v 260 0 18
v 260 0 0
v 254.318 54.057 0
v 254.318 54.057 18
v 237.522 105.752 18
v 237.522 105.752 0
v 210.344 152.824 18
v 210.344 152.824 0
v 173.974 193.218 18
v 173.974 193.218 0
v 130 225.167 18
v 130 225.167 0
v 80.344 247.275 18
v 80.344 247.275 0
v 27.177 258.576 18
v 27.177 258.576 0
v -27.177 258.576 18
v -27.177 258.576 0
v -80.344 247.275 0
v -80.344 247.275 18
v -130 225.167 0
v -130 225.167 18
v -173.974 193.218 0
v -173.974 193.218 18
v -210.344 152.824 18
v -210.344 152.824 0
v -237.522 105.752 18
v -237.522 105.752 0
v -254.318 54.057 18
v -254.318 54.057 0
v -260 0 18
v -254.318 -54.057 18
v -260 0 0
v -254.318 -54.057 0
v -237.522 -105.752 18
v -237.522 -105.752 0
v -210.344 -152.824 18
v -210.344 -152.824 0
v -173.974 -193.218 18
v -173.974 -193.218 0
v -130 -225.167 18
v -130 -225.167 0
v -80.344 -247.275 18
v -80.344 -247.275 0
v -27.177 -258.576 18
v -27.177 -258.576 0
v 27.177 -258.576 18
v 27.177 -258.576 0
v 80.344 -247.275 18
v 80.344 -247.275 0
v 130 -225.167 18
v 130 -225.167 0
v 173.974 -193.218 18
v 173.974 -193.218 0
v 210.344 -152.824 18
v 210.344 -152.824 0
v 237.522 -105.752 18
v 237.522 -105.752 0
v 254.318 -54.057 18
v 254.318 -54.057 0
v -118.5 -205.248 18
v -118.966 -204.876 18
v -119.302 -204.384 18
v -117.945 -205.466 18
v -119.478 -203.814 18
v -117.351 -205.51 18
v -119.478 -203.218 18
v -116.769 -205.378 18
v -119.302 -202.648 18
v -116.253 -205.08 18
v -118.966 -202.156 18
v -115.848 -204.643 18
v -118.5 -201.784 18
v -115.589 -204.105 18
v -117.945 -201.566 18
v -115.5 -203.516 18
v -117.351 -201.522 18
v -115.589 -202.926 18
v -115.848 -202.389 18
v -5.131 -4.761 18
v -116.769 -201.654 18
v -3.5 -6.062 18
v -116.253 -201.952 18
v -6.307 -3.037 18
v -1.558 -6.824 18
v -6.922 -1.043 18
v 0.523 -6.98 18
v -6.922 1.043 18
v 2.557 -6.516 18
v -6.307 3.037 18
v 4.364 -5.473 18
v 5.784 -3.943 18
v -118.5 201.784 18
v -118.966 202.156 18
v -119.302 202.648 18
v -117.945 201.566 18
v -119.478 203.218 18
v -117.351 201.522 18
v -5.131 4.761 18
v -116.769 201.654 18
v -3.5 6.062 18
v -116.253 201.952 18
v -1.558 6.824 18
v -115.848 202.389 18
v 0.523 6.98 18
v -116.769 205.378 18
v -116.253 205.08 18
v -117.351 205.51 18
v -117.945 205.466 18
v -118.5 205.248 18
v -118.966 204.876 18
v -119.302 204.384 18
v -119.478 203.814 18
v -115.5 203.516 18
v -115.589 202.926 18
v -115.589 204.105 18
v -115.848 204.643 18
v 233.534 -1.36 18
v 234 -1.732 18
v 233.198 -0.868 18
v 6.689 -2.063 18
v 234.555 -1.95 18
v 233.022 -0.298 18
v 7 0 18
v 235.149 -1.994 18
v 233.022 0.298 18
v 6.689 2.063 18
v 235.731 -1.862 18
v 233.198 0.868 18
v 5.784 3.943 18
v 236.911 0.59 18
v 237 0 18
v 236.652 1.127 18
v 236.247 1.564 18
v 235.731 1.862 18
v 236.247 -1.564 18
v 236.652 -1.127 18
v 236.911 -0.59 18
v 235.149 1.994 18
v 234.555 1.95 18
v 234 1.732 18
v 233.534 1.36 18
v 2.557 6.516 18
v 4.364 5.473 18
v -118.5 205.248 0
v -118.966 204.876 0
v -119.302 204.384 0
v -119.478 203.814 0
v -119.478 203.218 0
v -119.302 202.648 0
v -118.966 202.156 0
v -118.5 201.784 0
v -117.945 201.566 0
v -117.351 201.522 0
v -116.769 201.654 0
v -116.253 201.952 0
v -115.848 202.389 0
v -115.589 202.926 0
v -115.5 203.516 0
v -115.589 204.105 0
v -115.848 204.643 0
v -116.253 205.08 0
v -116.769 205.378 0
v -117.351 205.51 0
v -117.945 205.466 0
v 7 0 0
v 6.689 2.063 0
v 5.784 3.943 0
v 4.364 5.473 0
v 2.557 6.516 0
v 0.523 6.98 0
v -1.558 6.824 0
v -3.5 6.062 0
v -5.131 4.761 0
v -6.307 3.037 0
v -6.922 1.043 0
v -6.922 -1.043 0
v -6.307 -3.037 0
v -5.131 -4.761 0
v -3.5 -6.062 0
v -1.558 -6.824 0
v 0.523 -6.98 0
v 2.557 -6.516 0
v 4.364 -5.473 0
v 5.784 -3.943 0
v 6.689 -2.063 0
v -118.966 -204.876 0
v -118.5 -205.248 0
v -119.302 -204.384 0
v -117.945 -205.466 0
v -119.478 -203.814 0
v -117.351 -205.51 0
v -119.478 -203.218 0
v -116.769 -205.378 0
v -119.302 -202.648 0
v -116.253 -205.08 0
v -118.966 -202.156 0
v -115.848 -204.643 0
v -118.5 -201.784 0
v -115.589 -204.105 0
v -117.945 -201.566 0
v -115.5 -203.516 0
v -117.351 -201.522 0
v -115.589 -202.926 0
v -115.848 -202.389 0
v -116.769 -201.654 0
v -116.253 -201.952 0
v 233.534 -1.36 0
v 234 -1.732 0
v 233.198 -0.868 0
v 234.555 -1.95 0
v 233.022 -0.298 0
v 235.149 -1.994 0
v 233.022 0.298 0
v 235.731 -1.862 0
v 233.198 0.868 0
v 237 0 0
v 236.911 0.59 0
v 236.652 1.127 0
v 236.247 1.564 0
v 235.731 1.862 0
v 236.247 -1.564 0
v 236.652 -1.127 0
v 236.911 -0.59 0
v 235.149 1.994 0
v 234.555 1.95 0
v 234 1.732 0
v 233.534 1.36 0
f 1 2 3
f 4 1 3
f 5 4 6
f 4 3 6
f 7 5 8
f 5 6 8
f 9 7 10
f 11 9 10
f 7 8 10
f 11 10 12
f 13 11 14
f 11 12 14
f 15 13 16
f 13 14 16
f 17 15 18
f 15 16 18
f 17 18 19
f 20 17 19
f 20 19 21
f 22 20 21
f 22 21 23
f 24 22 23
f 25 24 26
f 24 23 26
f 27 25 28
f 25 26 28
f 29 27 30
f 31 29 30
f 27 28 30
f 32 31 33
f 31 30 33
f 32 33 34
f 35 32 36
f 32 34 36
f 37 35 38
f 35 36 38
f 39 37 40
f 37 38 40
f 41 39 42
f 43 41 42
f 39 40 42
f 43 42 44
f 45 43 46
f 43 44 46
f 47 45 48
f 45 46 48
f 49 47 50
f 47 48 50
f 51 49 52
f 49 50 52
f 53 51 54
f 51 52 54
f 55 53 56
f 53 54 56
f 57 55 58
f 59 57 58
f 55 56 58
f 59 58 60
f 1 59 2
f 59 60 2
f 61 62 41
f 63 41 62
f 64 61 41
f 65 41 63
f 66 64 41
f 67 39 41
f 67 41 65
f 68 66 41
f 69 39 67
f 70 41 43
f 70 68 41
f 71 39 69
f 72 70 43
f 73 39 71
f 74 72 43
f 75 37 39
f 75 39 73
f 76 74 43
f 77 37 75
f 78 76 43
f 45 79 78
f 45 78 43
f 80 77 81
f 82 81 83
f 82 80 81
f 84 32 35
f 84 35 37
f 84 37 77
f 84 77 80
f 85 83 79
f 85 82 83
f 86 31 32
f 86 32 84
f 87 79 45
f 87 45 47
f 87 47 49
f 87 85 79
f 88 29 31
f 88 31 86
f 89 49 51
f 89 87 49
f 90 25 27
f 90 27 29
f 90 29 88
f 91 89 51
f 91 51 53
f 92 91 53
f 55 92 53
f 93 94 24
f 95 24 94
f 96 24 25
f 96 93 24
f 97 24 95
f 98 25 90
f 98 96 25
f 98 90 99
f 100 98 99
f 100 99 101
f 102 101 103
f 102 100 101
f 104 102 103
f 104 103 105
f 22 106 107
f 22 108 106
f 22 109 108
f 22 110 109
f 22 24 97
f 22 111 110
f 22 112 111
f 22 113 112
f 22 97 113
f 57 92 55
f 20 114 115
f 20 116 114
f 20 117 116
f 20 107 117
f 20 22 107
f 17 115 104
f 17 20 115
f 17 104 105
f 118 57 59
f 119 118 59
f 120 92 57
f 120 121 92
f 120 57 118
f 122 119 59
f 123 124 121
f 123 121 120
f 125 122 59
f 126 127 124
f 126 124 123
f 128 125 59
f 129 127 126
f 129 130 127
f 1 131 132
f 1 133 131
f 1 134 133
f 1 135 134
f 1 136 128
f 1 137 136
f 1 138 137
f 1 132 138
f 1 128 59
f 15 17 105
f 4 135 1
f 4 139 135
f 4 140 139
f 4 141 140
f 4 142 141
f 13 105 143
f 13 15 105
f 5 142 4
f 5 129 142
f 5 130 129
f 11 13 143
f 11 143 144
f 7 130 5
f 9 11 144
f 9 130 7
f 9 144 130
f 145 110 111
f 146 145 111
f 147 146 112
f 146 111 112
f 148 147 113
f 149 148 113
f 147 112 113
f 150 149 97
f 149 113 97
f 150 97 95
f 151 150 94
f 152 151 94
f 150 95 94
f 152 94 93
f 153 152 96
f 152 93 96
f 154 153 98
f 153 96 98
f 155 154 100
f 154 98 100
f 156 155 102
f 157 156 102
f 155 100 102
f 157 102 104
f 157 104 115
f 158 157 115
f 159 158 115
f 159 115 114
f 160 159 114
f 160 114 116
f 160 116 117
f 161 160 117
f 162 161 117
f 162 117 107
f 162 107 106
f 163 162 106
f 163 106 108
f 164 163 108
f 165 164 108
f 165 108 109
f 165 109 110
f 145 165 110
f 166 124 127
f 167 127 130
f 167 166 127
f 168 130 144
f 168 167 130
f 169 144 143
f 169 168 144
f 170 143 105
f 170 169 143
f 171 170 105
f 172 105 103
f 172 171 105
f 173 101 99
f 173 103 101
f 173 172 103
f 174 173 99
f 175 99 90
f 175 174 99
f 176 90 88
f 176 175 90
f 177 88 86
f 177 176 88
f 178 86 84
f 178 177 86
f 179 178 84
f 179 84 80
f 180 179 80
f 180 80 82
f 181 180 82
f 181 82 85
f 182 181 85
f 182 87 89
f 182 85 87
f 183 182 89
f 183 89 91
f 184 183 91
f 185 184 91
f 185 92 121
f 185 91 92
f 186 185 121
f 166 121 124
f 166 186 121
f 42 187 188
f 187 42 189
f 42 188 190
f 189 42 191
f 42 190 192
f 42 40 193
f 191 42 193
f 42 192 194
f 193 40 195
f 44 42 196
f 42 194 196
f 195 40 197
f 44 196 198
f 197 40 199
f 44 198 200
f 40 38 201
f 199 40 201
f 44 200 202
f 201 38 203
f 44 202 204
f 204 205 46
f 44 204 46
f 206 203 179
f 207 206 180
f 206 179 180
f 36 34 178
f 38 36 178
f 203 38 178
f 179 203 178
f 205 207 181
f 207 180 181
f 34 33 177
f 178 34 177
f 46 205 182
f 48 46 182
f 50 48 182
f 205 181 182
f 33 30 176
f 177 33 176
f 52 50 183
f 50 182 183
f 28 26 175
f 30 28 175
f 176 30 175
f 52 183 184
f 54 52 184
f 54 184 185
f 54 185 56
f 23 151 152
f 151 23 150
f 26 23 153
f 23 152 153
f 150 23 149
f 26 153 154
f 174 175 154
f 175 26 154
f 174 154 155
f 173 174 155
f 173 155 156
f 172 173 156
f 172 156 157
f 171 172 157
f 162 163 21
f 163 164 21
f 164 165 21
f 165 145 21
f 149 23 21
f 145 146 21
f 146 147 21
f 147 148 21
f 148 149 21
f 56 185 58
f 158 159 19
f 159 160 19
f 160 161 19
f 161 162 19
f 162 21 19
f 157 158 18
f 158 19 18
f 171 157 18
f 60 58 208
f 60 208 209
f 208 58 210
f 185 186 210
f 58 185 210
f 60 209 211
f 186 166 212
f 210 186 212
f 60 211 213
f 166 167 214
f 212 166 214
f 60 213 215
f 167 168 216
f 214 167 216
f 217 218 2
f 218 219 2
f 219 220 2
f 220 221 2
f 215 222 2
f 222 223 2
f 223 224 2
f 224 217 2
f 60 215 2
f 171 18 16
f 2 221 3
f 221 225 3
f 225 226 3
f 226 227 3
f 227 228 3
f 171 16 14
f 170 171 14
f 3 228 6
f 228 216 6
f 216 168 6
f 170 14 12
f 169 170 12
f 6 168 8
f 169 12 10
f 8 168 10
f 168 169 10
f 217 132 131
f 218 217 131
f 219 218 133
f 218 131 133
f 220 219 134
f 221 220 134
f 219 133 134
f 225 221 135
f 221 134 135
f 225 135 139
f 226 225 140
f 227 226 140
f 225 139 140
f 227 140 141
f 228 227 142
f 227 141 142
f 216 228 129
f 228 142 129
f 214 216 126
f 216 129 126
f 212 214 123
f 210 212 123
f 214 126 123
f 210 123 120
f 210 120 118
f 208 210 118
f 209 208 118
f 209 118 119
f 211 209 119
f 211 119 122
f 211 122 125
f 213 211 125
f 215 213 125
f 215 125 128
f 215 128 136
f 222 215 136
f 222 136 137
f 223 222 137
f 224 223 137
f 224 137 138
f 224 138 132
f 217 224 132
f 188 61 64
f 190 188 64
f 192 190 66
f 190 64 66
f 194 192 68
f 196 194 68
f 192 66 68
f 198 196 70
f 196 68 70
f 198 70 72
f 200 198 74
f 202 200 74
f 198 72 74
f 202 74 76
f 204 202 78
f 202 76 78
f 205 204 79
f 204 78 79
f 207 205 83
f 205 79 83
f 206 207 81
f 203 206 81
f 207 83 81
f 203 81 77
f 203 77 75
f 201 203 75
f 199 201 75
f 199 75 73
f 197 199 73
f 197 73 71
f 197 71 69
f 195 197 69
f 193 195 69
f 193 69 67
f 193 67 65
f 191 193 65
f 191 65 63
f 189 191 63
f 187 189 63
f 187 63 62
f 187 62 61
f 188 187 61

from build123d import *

# Parameters (mm, degrees)
SKETCH_R           = 260
PAD_DEPTH          = 18
SKETCH001_R        = 2
POCKET_DEPTH       = 1489.223621
POLARPATTERN_COUNT = 3
SKETCH002_R        = 7
POCKET001_DEPTH    = 18.001


with BuildPart() as part:
    # Sketch → Pad (new body)
    with BuildSketch(Plane.XY):
        Circle(SKETCH_R)
    extrude(amount=PAD_DEPTH)

    # Sketch001 (on Face3 of Pad) → Pocket (cut, through all)
    with BuildSketch(Plane.XY.offset(18)):
        with Locations((235, 0)):
            Circle(SKETCH001_R)
    pocket = extrude(amount=-POCKET_DEPTH, mode=Mode.SUBTRACT)

    # PolarPattern: Pocket ×3 about axis
    polarpattern_axis = Axis((0, 0, 18), (0, 0, 1))
    for i in range(1, POLARPATTERN_COUNT):
        add(pocket.rotate(polarpattern_axis, i * 360 / POLARPATTERN_COUNT), mode=Mode.SUBTRACT)

    # Sketch002 → Pocket001 (cut, through all)
    with BuildSketch(Plane.XY):
        Circle(SKETCH002_R)
    extrude(amount=POCKET001_DEPTH, mode=Mode.SUBTRACT)


solid = part.part
